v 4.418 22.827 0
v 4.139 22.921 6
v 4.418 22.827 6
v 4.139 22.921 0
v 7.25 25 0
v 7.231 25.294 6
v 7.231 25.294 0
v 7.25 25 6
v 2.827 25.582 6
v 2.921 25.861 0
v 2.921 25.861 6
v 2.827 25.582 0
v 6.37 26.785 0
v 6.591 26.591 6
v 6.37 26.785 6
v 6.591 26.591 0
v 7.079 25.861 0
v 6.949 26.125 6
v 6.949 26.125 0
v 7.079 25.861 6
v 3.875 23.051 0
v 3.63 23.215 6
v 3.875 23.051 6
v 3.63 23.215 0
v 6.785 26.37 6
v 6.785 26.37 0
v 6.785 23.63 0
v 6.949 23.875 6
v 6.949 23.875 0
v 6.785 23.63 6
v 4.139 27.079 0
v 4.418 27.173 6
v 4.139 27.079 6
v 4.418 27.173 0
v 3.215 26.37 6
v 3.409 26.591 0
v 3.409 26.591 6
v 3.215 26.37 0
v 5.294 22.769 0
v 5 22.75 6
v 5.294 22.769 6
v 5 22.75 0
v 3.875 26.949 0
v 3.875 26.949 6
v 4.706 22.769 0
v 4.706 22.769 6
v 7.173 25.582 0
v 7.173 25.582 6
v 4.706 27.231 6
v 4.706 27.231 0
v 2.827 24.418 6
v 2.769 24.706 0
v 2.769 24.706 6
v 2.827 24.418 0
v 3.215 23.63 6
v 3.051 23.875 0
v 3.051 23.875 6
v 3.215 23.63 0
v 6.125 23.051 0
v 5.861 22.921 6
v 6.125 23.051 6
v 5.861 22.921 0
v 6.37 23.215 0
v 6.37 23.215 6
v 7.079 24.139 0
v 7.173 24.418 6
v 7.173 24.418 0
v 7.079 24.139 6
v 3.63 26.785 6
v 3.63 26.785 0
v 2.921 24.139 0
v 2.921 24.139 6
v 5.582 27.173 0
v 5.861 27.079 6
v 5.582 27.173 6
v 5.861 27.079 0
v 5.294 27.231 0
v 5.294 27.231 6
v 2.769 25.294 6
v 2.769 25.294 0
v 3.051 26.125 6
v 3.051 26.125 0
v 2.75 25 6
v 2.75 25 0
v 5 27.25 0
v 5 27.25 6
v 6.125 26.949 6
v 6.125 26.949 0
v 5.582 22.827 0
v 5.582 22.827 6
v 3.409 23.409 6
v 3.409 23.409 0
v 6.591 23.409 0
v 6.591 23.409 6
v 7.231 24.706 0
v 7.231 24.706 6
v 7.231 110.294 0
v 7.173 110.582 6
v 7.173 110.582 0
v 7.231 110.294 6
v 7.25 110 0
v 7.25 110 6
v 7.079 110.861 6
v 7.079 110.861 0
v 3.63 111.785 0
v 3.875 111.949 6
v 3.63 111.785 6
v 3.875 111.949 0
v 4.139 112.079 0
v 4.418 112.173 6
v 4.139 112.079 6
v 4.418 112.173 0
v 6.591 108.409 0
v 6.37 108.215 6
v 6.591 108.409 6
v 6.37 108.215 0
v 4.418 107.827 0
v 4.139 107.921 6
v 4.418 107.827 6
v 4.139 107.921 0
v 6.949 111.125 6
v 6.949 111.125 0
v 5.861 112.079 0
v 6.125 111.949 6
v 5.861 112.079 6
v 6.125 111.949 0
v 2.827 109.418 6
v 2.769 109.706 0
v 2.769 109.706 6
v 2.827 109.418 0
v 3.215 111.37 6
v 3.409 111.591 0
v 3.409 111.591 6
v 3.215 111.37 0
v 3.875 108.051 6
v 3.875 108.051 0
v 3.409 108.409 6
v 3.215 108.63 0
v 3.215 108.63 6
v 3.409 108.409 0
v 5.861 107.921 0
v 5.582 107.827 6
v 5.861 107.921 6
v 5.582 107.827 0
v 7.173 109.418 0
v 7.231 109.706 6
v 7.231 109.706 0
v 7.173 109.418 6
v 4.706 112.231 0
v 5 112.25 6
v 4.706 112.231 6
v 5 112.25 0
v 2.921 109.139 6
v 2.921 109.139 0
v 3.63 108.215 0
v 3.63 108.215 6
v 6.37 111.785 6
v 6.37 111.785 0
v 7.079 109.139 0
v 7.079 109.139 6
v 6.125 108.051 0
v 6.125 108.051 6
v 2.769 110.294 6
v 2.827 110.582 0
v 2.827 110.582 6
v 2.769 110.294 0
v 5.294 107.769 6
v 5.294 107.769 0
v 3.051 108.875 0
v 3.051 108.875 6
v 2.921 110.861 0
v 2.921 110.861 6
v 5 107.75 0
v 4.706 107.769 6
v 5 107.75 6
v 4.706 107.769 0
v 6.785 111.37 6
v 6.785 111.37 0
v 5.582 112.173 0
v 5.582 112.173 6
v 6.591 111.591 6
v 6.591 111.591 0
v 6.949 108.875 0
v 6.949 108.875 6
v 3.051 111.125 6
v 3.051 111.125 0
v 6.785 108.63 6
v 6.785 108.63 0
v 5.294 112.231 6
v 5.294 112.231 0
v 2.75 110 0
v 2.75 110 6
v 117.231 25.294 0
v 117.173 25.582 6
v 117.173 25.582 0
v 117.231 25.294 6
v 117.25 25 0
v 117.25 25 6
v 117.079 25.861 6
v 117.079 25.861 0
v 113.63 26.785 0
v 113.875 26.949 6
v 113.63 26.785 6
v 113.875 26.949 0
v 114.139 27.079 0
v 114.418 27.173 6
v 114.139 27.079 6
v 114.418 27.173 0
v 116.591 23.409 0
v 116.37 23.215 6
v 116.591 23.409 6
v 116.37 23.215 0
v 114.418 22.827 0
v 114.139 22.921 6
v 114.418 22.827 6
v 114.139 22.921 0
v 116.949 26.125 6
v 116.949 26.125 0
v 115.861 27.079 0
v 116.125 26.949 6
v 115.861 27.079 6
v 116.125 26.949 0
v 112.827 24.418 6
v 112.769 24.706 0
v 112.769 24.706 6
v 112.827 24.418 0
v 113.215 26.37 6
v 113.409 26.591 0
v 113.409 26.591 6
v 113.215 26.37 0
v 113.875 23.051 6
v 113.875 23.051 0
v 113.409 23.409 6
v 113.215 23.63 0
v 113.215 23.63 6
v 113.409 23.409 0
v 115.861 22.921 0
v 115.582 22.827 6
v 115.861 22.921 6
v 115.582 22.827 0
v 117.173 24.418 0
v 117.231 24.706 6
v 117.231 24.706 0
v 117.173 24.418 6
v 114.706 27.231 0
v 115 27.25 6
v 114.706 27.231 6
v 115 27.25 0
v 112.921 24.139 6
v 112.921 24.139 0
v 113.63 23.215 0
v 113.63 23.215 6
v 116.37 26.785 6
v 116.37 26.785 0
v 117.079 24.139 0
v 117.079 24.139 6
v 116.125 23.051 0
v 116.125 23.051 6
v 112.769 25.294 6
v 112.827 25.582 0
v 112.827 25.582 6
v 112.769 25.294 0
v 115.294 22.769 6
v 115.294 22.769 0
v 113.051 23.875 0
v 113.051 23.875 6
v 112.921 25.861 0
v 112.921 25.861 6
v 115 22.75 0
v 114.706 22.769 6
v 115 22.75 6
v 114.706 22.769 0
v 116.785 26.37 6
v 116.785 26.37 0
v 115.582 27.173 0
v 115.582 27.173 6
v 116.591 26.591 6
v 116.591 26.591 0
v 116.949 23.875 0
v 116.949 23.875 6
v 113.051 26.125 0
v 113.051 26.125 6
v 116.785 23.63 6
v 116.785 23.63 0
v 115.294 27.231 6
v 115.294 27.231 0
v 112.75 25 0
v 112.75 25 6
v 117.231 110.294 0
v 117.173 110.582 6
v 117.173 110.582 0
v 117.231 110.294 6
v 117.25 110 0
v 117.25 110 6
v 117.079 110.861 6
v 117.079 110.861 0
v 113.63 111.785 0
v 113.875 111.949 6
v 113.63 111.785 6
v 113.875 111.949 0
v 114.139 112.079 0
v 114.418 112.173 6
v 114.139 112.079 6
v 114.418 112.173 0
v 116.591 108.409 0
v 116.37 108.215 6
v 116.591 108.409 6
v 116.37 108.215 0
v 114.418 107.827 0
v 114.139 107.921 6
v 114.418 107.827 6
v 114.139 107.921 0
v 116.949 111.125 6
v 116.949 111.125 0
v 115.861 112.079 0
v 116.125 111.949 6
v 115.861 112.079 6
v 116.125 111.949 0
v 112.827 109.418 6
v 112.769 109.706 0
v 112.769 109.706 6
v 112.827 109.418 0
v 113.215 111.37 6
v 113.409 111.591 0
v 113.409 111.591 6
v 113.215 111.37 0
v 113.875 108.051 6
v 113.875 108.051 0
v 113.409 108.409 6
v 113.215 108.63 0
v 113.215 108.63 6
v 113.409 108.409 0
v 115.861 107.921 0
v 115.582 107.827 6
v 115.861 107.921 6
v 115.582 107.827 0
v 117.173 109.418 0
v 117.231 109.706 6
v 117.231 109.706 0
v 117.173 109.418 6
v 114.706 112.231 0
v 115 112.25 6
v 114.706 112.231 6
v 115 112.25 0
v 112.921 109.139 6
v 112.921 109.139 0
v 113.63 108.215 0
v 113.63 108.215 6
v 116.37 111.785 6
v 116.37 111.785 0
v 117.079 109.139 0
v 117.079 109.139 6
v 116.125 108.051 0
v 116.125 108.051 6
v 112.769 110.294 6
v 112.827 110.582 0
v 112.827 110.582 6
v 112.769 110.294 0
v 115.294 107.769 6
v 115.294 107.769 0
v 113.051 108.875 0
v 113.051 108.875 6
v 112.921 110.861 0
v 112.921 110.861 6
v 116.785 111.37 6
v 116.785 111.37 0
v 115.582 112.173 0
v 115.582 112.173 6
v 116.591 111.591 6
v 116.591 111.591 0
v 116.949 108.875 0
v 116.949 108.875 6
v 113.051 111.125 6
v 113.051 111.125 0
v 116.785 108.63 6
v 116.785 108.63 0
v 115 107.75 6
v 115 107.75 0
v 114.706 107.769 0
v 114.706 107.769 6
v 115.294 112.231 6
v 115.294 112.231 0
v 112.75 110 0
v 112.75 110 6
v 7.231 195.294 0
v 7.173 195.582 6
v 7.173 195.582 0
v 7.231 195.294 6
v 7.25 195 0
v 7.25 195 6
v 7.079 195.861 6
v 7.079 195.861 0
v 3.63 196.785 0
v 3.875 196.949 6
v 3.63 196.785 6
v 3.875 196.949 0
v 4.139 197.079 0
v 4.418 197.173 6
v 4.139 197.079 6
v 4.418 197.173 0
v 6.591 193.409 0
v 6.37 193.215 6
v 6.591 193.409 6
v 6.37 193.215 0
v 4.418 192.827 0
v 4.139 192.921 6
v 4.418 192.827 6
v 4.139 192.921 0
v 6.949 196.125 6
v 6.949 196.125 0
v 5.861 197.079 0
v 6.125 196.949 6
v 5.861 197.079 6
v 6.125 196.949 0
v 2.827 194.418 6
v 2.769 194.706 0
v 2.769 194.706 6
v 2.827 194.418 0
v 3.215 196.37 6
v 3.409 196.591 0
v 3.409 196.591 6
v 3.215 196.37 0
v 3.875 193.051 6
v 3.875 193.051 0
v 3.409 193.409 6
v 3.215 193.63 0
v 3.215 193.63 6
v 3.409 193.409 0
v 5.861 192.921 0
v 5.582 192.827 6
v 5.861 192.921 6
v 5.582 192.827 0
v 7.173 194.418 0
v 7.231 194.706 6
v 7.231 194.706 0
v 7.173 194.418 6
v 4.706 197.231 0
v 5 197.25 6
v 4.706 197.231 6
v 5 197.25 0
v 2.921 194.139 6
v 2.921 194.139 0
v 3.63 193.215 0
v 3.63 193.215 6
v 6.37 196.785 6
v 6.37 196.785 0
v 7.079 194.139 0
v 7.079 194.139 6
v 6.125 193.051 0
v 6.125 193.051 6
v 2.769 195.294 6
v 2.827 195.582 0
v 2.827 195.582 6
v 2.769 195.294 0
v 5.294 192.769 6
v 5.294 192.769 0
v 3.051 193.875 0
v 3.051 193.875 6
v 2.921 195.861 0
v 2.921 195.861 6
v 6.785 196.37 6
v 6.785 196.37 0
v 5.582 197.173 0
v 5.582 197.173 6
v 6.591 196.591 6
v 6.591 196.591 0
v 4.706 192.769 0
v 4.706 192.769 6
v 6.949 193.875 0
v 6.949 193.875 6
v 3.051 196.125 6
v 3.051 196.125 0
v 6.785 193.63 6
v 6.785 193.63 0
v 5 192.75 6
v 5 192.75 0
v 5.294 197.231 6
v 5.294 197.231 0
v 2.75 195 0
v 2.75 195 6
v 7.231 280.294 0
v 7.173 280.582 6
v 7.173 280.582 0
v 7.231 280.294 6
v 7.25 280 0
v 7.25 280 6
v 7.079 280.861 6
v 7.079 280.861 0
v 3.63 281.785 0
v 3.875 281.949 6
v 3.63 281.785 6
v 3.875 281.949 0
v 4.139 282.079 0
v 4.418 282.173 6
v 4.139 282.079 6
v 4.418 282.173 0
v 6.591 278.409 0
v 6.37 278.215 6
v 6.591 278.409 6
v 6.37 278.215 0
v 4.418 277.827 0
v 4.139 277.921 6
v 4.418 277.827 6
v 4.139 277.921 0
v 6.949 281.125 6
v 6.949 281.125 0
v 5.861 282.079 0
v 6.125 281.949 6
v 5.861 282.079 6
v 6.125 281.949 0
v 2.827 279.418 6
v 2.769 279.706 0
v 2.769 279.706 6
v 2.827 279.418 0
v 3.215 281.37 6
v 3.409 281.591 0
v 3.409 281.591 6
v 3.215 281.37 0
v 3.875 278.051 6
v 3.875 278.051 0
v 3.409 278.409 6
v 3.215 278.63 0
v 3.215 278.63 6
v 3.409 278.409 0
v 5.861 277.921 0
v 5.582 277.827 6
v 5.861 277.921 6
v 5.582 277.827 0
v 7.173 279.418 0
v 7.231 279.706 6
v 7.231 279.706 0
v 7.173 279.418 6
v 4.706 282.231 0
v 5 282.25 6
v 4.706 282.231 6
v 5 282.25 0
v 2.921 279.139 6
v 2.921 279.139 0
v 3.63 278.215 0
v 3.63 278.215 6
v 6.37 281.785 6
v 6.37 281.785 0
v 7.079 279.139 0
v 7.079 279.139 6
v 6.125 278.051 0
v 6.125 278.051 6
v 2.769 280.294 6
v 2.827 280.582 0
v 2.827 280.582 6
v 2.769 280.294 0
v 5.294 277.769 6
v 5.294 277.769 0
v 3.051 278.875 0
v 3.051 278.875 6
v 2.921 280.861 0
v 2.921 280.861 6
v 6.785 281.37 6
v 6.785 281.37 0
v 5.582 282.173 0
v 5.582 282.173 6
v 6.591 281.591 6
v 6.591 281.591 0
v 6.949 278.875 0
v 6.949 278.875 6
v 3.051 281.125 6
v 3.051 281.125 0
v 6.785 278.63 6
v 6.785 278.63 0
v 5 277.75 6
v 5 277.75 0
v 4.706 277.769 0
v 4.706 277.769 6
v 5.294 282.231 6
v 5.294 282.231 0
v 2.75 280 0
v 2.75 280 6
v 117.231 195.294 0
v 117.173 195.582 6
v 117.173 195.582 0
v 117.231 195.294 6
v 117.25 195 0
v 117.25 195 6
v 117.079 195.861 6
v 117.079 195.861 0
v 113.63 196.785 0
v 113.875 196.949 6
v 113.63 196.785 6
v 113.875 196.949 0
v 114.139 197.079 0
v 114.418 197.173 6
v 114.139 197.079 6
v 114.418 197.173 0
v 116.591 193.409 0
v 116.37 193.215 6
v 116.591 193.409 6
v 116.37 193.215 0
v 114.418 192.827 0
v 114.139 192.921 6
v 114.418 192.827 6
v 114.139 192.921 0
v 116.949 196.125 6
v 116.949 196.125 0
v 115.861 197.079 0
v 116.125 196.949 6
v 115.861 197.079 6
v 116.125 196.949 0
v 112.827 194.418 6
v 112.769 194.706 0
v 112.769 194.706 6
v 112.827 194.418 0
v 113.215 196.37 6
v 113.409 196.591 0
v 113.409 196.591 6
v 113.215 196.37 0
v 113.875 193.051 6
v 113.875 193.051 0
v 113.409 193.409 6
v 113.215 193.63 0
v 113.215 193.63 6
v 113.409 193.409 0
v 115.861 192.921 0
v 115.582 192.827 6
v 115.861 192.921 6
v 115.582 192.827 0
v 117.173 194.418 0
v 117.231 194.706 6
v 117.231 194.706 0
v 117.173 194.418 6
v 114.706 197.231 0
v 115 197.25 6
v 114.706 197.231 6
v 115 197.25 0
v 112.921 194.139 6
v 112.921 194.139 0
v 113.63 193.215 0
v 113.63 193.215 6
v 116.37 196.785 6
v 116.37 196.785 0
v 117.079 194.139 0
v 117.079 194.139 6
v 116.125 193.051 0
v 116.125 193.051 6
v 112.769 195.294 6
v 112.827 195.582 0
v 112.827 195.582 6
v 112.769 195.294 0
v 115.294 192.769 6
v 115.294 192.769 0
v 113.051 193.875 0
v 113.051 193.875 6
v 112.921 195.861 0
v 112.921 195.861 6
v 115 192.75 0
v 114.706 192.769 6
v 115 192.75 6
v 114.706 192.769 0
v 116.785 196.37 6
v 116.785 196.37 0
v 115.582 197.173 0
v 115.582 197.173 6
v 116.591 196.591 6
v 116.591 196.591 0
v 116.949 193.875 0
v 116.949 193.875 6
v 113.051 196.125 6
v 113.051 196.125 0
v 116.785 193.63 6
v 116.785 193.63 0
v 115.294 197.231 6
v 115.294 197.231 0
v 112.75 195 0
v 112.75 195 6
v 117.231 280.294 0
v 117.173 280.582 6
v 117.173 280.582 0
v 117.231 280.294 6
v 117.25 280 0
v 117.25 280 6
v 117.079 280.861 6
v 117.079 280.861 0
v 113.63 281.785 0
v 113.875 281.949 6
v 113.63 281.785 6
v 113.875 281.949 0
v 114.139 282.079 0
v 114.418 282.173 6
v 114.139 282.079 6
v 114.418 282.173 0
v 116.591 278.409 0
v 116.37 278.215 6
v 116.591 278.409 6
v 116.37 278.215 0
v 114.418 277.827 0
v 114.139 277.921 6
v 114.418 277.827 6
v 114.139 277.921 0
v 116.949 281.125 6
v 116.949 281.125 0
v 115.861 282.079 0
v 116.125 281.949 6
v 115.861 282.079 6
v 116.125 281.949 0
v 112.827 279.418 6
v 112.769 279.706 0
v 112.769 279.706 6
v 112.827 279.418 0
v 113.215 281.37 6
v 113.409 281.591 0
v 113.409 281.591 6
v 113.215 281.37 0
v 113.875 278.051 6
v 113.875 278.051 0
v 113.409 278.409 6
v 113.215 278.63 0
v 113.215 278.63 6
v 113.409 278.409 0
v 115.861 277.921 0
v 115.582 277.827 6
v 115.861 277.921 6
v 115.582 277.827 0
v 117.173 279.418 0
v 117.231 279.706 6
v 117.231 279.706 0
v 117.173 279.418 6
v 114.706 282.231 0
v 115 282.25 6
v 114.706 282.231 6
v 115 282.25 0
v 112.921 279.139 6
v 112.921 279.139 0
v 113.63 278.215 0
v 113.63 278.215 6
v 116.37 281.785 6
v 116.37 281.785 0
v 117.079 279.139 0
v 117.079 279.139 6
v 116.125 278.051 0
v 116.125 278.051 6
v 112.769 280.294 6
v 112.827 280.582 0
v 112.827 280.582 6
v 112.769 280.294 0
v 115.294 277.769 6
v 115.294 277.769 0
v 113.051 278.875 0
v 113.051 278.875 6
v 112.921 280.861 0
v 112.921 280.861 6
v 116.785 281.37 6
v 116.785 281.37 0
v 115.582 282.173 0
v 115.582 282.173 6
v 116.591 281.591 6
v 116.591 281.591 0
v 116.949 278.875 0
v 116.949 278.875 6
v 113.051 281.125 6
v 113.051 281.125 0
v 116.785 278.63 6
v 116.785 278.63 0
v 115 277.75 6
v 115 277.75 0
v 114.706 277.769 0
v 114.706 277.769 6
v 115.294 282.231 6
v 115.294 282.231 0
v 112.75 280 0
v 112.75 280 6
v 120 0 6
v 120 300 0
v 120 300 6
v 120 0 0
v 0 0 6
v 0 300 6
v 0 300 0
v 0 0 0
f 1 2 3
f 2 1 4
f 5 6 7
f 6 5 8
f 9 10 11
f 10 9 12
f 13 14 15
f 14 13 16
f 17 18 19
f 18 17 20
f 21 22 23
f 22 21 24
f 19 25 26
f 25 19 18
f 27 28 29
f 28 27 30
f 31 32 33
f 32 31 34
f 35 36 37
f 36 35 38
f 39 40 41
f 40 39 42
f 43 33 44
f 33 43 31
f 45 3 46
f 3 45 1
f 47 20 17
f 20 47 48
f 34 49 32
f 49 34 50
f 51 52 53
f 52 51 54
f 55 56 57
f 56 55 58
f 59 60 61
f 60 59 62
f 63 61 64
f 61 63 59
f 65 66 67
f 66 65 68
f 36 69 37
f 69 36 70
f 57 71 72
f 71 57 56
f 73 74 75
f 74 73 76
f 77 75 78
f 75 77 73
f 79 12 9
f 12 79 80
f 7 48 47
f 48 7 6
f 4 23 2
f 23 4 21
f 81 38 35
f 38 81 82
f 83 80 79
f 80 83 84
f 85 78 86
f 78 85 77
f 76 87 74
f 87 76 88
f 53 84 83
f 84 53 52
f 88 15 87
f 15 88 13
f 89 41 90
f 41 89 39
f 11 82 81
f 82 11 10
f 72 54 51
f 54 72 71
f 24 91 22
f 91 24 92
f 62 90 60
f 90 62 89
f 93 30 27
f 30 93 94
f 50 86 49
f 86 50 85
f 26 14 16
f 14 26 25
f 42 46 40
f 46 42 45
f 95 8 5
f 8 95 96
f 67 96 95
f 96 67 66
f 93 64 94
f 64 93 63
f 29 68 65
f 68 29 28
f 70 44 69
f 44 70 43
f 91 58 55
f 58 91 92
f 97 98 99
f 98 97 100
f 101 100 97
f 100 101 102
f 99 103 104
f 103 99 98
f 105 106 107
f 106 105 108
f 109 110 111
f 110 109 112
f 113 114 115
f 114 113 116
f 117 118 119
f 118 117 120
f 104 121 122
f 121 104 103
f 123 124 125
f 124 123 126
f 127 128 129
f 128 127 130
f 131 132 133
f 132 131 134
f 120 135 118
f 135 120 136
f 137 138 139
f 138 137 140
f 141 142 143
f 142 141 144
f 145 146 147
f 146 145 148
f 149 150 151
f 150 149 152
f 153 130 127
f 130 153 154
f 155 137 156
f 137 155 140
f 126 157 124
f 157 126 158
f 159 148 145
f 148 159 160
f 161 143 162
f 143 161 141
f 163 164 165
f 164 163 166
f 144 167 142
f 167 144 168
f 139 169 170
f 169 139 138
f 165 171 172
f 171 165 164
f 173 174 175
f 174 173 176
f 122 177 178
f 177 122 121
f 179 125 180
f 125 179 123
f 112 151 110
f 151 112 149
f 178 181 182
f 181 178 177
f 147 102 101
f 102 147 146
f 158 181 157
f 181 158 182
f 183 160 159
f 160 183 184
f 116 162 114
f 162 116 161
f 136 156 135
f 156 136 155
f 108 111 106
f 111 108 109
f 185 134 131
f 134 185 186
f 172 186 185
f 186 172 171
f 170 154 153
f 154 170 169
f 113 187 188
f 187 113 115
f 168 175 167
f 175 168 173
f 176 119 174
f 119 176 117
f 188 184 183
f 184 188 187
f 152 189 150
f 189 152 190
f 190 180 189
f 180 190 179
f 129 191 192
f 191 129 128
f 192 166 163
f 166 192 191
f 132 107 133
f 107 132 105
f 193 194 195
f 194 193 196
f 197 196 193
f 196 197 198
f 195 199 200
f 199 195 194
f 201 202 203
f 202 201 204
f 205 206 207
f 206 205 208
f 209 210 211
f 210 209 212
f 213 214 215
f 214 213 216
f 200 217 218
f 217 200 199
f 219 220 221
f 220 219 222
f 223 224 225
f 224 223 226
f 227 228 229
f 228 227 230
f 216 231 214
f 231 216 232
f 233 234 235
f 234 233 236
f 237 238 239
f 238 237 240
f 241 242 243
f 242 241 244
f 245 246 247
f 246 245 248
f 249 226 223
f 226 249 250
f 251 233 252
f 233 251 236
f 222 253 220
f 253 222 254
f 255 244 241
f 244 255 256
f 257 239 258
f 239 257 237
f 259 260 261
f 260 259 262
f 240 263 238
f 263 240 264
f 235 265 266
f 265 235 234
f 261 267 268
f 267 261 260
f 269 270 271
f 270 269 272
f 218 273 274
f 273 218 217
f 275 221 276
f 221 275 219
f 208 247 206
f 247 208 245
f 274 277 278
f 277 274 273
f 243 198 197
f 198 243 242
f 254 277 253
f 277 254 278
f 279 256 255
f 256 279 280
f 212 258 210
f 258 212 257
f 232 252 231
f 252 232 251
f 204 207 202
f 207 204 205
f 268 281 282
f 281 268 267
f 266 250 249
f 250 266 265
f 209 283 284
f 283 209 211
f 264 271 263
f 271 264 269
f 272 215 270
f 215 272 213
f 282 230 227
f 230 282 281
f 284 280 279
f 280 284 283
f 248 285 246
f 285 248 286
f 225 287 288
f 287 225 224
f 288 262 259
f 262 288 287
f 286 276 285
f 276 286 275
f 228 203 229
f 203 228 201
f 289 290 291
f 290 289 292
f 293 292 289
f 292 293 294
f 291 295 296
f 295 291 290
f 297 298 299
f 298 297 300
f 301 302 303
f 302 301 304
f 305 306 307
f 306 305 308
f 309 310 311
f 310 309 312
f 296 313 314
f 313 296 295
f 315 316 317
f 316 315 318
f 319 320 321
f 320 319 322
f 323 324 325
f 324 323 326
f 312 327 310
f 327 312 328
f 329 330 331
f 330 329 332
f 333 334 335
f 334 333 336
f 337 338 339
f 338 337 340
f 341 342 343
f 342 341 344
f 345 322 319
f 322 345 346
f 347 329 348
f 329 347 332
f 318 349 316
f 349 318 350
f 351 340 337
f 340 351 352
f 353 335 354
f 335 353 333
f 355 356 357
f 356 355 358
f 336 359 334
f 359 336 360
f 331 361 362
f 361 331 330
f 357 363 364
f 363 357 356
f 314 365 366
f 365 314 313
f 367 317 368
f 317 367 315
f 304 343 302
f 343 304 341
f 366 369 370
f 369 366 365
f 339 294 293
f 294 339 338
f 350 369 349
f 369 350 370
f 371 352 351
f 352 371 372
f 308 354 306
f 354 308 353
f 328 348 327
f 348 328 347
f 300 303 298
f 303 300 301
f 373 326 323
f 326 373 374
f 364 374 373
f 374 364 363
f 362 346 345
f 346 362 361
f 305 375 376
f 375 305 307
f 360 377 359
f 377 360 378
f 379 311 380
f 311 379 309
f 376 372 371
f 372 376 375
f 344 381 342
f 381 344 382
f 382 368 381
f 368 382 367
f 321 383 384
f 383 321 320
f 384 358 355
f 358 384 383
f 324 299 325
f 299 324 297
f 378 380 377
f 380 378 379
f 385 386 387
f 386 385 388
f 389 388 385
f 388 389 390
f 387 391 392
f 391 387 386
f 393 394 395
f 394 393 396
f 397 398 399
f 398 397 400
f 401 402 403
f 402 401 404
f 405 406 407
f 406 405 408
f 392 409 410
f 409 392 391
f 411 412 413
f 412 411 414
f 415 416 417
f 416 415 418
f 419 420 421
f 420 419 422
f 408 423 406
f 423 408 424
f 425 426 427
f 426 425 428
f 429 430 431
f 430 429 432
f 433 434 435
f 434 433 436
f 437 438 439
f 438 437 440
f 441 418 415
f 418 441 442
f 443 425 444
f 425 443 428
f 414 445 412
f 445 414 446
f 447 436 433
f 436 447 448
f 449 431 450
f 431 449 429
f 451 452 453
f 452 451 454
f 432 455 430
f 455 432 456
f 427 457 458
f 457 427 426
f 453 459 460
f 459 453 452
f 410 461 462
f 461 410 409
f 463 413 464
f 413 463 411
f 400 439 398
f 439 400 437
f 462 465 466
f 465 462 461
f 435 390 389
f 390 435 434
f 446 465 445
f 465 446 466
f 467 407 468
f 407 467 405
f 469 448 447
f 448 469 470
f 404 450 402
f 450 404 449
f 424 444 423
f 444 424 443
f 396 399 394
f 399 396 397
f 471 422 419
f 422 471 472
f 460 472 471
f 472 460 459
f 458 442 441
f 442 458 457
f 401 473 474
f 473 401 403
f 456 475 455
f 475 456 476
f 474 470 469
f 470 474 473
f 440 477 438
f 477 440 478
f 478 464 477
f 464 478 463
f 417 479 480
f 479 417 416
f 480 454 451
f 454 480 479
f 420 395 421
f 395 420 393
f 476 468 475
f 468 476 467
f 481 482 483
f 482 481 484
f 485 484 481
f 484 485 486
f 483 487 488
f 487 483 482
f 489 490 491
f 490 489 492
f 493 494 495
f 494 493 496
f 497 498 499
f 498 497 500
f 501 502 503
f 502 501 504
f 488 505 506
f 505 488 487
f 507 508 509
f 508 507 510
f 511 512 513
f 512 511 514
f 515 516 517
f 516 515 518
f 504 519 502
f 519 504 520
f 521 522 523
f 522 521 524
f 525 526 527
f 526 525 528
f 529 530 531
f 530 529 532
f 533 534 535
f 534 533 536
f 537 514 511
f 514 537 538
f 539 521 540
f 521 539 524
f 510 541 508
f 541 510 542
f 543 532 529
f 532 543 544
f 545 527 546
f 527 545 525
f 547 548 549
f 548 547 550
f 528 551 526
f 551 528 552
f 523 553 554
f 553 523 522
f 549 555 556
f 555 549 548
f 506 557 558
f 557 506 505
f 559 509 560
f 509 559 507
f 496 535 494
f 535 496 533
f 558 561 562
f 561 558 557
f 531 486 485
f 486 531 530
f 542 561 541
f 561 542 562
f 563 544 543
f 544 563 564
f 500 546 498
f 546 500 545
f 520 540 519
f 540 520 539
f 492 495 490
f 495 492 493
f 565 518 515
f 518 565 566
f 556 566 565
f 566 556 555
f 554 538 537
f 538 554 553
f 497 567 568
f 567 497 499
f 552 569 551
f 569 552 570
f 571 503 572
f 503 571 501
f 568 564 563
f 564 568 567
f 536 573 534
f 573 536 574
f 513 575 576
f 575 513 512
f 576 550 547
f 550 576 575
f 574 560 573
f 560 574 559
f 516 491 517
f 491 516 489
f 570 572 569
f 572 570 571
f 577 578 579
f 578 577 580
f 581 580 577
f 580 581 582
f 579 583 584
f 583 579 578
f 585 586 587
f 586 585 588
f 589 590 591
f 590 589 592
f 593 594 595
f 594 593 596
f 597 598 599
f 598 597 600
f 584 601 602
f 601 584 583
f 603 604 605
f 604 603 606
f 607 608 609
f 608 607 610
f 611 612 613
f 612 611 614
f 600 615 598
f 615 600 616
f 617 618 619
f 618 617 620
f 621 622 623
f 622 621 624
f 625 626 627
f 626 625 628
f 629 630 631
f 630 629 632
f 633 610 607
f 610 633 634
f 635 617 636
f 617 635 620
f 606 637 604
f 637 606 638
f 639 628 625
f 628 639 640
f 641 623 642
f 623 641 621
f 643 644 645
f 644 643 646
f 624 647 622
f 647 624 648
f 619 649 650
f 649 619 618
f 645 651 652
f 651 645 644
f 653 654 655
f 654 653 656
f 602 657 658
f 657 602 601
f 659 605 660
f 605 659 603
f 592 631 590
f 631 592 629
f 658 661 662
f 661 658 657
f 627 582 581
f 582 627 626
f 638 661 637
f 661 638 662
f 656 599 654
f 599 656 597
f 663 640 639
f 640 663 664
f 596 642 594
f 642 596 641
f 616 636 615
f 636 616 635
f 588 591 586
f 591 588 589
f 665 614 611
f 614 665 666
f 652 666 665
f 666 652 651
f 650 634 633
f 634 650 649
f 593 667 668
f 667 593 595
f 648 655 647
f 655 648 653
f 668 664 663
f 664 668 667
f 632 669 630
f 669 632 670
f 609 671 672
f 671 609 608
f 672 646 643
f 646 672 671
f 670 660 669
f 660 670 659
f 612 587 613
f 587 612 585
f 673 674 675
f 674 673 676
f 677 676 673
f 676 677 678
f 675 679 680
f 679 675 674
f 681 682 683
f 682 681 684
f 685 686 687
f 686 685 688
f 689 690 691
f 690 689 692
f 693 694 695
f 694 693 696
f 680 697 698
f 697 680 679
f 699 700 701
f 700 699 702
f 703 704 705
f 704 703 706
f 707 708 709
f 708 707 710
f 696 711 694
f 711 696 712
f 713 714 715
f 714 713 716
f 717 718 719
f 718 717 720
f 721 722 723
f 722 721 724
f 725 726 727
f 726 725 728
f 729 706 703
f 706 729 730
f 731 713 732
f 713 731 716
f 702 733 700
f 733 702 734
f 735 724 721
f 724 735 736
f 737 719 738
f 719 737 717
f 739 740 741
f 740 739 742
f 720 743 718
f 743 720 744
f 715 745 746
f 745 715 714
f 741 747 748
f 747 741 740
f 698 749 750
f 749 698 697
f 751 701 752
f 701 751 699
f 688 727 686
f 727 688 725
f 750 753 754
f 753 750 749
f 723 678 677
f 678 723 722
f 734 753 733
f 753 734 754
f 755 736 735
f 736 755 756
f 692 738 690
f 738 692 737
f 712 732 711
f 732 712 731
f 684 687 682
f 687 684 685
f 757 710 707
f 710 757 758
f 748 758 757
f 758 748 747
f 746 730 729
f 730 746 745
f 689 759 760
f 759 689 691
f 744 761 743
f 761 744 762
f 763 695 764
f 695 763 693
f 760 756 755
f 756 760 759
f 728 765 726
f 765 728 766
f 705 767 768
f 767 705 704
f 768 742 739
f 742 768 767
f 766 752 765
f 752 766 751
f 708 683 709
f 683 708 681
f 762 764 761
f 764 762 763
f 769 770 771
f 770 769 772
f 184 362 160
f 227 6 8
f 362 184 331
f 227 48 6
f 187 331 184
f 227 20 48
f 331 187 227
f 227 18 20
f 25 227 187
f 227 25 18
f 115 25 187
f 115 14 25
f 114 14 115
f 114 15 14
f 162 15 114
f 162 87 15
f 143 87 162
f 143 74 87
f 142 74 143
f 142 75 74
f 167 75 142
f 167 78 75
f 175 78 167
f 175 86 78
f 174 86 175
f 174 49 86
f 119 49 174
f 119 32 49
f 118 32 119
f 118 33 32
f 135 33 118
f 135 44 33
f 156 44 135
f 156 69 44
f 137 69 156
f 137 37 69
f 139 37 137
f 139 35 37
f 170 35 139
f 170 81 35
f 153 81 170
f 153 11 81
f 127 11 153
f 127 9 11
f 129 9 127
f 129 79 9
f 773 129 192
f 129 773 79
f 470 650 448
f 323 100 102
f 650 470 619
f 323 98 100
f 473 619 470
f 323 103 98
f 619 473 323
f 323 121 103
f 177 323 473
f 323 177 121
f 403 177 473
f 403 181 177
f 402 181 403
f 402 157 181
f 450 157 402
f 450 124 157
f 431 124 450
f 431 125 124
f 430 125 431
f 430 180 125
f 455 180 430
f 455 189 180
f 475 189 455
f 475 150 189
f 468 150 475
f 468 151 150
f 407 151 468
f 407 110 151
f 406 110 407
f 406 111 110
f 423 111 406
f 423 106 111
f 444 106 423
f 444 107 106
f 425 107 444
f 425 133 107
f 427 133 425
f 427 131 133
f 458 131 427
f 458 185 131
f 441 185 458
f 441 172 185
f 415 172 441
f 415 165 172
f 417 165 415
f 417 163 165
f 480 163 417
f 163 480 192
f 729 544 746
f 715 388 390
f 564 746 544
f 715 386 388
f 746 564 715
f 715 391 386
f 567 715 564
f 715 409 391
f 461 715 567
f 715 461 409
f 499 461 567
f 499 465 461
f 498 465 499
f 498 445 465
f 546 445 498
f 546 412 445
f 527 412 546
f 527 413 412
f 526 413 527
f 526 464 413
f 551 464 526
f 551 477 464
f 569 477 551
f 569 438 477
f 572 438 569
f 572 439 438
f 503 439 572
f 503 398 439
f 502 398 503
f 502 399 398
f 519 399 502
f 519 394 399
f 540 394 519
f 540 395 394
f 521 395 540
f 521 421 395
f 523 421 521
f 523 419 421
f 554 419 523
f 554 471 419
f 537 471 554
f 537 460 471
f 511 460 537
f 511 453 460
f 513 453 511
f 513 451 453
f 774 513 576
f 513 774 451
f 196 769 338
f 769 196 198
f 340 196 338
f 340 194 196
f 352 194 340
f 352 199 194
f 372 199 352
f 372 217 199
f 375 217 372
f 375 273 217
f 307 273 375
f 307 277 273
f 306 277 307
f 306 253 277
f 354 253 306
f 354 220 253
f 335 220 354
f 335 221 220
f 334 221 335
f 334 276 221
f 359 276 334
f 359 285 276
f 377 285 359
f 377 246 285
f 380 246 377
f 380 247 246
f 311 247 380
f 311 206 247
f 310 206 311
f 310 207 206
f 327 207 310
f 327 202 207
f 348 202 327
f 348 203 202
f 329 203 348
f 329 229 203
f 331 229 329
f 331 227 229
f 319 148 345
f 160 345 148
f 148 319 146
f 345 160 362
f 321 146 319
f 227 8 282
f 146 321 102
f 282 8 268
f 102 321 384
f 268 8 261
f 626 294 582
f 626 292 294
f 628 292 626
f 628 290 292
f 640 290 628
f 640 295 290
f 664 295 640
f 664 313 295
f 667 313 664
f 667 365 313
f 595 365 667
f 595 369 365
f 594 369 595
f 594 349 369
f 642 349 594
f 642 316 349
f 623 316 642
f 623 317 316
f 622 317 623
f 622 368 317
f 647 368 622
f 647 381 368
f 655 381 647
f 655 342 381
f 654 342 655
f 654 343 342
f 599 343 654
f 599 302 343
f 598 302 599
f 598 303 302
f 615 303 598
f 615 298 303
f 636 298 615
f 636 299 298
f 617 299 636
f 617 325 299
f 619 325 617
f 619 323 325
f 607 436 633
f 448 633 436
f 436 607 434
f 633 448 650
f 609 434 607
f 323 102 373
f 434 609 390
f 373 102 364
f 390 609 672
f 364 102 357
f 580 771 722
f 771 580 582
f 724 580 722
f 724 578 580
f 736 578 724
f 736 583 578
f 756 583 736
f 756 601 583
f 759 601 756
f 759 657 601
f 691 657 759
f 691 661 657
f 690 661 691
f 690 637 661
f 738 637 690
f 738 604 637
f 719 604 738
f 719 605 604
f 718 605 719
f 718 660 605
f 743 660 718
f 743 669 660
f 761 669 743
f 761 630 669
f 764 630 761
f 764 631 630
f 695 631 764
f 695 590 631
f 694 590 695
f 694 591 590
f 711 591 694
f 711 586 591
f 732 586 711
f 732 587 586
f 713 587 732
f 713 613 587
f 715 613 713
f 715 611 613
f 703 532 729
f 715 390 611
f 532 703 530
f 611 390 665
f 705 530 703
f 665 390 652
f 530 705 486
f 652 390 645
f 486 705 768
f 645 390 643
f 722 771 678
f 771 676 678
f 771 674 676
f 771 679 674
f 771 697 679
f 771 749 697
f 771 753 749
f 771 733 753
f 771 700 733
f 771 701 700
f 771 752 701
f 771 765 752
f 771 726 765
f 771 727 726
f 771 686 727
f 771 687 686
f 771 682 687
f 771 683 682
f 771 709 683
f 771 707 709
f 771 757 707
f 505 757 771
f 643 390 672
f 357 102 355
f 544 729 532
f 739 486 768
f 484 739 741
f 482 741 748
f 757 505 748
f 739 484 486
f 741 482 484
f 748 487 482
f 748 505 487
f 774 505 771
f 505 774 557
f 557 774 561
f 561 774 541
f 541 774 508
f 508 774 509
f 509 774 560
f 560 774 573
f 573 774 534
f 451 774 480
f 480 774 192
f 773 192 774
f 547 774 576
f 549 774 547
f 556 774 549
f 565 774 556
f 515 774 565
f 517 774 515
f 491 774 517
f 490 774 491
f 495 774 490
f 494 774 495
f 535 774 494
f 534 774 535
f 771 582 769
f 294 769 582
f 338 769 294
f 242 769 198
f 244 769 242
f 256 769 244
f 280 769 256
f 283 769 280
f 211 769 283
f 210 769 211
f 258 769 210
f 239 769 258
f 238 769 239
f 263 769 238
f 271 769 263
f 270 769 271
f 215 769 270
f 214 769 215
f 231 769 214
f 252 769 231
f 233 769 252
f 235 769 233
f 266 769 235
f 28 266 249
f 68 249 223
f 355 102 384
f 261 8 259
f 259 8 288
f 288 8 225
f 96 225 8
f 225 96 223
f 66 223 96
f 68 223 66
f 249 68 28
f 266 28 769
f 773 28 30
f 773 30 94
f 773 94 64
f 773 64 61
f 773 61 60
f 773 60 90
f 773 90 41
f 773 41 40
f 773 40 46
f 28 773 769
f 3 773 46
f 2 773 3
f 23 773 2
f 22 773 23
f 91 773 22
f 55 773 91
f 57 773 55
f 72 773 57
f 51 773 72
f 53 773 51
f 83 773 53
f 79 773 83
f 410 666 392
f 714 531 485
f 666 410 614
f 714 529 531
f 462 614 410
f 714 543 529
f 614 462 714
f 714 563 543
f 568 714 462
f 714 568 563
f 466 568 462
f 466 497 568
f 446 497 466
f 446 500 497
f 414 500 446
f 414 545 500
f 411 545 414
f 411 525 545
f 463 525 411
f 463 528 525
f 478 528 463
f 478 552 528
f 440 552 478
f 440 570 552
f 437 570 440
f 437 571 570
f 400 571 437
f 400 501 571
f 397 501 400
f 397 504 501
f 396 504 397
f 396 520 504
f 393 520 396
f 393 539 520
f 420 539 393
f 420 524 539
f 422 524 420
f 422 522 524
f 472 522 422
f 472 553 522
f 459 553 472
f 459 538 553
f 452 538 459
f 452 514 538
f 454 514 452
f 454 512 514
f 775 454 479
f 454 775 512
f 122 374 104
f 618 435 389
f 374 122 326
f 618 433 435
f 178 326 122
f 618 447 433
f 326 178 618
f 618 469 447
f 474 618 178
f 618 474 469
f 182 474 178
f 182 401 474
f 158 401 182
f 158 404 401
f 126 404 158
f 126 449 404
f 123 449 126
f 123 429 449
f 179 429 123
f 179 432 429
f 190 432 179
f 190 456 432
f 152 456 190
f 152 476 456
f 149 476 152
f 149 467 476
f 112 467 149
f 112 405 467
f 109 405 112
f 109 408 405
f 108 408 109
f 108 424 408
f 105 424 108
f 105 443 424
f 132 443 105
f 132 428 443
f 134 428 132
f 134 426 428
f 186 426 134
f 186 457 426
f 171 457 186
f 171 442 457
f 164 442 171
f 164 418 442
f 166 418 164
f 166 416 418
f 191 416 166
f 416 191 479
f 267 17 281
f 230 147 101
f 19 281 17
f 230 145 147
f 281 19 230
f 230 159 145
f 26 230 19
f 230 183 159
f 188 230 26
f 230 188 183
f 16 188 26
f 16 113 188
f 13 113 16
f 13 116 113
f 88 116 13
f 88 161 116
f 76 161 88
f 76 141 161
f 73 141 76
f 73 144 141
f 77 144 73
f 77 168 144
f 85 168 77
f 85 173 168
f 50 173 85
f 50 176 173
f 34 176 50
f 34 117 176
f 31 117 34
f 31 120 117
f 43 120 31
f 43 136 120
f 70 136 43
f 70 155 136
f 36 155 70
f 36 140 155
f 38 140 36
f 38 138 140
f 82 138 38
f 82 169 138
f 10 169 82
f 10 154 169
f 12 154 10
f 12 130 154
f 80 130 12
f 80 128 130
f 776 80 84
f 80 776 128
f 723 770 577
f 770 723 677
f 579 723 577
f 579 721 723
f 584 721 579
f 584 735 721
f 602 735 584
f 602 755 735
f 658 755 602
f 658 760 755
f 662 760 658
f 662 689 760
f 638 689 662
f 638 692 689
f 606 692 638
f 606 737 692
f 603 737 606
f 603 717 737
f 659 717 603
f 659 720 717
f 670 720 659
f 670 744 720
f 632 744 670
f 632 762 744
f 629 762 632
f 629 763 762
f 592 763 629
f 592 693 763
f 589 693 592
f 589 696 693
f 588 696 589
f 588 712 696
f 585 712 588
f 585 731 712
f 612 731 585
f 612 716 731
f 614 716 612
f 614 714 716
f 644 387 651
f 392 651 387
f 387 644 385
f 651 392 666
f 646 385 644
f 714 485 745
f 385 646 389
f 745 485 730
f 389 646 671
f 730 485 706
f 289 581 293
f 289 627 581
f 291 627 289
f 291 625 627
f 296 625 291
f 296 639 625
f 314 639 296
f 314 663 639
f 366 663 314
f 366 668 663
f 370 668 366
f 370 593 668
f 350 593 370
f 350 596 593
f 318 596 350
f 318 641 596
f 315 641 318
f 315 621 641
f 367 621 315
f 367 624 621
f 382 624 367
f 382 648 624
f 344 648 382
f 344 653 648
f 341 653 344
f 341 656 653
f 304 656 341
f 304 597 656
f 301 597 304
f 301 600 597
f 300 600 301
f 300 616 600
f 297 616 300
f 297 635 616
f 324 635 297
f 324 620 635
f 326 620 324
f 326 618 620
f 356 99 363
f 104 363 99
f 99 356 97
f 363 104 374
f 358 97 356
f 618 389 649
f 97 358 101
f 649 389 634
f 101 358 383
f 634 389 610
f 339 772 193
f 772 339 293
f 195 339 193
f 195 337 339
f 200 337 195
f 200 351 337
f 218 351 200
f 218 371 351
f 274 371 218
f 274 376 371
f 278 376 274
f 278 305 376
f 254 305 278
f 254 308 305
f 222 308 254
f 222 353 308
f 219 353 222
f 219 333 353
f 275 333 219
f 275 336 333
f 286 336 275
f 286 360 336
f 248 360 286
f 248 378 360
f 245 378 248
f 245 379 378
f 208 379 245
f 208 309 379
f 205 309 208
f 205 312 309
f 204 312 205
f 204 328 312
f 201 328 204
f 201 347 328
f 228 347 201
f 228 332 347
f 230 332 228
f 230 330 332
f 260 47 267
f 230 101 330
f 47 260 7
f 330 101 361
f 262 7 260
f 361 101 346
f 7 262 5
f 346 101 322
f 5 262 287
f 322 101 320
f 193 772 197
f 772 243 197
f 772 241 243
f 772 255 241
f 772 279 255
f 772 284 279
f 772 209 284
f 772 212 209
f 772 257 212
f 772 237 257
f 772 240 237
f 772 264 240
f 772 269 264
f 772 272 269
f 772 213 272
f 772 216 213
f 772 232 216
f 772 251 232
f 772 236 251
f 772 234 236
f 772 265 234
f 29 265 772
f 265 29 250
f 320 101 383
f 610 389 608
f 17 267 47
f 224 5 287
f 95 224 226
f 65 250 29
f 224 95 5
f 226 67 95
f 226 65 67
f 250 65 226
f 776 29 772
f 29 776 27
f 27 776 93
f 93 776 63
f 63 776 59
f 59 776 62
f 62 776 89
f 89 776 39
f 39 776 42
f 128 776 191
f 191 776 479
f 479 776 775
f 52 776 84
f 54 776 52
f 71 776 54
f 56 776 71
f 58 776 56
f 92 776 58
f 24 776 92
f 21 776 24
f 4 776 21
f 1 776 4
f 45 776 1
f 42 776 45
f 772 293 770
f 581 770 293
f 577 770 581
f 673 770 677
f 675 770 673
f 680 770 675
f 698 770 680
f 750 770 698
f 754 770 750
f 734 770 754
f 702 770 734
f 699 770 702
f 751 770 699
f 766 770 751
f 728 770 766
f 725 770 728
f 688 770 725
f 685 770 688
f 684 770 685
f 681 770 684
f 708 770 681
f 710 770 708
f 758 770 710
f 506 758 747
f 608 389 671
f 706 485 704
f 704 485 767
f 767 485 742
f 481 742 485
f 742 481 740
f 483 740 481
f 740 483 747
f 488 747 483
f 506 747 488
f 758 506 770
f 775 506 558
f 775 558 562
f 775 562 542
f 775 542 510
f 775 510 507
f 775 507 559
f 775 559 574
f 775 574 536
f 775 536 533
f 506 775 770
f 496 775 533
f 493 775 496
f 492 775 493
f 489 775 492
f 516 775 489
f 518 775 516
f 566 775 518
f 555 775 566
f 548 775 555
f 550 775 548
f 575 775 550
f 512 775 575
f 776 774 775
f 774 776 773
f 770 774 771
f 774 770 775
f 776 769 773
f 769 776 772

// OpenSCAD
// ============================================
// 肉牛养殖场巡检机器人 - 平台板图纸
// 文件：巡检机器人平台板.scad
// 用法：OpenSCAD 打开 → F6 渲染 → F7 导出 STL → 切片打印
// ============================================

// ---------- 平台板参数 ----------
plate_w = 120;   // 平台宽(左右) mm
plate_l = 300;   // 平台长(前后，贯穿整车) mm
plate_t = 6;     // 平台厚 mm
hole_d  = 4.5;   // 螺丝孔直径(M4 通过孔) mm
$fn = 48;        // 圆滑度

// ---------- 8 个螺丝孔坐标 ----------
// [左右X, 前后Y] 单位 mm
// 左列 X=5 (离左边缘 5mm)，右列 X=115 (离右边缘 5mm)
// 前单元 Y=25, 110 (孔距 85mm，孔1离前端 25mm)
// 后单元 Y=195, 280 (孔距 85mm，孔1离前端 195mm)
function holes() = [
  [5,  25],  [5,  110],   // 左前单元耳朵
  [115, 25], [115, 110],  // 右前单元耳朵
  [5,  195], [5,  280],   // 左后单元耳朵
  [115, 195], [115, 280]  // 右后单元耳朵
];

// ---------- 平台板 ----------
module plate() {
  difference() {
    cube([plate_w, plate_l, plate_t]);
    for (h = holes())
      translate([h[0], h[1], -1])
        cylinder(d = hole_d, h = plate_t + 2);
  }
}

// 渲染
plate();
